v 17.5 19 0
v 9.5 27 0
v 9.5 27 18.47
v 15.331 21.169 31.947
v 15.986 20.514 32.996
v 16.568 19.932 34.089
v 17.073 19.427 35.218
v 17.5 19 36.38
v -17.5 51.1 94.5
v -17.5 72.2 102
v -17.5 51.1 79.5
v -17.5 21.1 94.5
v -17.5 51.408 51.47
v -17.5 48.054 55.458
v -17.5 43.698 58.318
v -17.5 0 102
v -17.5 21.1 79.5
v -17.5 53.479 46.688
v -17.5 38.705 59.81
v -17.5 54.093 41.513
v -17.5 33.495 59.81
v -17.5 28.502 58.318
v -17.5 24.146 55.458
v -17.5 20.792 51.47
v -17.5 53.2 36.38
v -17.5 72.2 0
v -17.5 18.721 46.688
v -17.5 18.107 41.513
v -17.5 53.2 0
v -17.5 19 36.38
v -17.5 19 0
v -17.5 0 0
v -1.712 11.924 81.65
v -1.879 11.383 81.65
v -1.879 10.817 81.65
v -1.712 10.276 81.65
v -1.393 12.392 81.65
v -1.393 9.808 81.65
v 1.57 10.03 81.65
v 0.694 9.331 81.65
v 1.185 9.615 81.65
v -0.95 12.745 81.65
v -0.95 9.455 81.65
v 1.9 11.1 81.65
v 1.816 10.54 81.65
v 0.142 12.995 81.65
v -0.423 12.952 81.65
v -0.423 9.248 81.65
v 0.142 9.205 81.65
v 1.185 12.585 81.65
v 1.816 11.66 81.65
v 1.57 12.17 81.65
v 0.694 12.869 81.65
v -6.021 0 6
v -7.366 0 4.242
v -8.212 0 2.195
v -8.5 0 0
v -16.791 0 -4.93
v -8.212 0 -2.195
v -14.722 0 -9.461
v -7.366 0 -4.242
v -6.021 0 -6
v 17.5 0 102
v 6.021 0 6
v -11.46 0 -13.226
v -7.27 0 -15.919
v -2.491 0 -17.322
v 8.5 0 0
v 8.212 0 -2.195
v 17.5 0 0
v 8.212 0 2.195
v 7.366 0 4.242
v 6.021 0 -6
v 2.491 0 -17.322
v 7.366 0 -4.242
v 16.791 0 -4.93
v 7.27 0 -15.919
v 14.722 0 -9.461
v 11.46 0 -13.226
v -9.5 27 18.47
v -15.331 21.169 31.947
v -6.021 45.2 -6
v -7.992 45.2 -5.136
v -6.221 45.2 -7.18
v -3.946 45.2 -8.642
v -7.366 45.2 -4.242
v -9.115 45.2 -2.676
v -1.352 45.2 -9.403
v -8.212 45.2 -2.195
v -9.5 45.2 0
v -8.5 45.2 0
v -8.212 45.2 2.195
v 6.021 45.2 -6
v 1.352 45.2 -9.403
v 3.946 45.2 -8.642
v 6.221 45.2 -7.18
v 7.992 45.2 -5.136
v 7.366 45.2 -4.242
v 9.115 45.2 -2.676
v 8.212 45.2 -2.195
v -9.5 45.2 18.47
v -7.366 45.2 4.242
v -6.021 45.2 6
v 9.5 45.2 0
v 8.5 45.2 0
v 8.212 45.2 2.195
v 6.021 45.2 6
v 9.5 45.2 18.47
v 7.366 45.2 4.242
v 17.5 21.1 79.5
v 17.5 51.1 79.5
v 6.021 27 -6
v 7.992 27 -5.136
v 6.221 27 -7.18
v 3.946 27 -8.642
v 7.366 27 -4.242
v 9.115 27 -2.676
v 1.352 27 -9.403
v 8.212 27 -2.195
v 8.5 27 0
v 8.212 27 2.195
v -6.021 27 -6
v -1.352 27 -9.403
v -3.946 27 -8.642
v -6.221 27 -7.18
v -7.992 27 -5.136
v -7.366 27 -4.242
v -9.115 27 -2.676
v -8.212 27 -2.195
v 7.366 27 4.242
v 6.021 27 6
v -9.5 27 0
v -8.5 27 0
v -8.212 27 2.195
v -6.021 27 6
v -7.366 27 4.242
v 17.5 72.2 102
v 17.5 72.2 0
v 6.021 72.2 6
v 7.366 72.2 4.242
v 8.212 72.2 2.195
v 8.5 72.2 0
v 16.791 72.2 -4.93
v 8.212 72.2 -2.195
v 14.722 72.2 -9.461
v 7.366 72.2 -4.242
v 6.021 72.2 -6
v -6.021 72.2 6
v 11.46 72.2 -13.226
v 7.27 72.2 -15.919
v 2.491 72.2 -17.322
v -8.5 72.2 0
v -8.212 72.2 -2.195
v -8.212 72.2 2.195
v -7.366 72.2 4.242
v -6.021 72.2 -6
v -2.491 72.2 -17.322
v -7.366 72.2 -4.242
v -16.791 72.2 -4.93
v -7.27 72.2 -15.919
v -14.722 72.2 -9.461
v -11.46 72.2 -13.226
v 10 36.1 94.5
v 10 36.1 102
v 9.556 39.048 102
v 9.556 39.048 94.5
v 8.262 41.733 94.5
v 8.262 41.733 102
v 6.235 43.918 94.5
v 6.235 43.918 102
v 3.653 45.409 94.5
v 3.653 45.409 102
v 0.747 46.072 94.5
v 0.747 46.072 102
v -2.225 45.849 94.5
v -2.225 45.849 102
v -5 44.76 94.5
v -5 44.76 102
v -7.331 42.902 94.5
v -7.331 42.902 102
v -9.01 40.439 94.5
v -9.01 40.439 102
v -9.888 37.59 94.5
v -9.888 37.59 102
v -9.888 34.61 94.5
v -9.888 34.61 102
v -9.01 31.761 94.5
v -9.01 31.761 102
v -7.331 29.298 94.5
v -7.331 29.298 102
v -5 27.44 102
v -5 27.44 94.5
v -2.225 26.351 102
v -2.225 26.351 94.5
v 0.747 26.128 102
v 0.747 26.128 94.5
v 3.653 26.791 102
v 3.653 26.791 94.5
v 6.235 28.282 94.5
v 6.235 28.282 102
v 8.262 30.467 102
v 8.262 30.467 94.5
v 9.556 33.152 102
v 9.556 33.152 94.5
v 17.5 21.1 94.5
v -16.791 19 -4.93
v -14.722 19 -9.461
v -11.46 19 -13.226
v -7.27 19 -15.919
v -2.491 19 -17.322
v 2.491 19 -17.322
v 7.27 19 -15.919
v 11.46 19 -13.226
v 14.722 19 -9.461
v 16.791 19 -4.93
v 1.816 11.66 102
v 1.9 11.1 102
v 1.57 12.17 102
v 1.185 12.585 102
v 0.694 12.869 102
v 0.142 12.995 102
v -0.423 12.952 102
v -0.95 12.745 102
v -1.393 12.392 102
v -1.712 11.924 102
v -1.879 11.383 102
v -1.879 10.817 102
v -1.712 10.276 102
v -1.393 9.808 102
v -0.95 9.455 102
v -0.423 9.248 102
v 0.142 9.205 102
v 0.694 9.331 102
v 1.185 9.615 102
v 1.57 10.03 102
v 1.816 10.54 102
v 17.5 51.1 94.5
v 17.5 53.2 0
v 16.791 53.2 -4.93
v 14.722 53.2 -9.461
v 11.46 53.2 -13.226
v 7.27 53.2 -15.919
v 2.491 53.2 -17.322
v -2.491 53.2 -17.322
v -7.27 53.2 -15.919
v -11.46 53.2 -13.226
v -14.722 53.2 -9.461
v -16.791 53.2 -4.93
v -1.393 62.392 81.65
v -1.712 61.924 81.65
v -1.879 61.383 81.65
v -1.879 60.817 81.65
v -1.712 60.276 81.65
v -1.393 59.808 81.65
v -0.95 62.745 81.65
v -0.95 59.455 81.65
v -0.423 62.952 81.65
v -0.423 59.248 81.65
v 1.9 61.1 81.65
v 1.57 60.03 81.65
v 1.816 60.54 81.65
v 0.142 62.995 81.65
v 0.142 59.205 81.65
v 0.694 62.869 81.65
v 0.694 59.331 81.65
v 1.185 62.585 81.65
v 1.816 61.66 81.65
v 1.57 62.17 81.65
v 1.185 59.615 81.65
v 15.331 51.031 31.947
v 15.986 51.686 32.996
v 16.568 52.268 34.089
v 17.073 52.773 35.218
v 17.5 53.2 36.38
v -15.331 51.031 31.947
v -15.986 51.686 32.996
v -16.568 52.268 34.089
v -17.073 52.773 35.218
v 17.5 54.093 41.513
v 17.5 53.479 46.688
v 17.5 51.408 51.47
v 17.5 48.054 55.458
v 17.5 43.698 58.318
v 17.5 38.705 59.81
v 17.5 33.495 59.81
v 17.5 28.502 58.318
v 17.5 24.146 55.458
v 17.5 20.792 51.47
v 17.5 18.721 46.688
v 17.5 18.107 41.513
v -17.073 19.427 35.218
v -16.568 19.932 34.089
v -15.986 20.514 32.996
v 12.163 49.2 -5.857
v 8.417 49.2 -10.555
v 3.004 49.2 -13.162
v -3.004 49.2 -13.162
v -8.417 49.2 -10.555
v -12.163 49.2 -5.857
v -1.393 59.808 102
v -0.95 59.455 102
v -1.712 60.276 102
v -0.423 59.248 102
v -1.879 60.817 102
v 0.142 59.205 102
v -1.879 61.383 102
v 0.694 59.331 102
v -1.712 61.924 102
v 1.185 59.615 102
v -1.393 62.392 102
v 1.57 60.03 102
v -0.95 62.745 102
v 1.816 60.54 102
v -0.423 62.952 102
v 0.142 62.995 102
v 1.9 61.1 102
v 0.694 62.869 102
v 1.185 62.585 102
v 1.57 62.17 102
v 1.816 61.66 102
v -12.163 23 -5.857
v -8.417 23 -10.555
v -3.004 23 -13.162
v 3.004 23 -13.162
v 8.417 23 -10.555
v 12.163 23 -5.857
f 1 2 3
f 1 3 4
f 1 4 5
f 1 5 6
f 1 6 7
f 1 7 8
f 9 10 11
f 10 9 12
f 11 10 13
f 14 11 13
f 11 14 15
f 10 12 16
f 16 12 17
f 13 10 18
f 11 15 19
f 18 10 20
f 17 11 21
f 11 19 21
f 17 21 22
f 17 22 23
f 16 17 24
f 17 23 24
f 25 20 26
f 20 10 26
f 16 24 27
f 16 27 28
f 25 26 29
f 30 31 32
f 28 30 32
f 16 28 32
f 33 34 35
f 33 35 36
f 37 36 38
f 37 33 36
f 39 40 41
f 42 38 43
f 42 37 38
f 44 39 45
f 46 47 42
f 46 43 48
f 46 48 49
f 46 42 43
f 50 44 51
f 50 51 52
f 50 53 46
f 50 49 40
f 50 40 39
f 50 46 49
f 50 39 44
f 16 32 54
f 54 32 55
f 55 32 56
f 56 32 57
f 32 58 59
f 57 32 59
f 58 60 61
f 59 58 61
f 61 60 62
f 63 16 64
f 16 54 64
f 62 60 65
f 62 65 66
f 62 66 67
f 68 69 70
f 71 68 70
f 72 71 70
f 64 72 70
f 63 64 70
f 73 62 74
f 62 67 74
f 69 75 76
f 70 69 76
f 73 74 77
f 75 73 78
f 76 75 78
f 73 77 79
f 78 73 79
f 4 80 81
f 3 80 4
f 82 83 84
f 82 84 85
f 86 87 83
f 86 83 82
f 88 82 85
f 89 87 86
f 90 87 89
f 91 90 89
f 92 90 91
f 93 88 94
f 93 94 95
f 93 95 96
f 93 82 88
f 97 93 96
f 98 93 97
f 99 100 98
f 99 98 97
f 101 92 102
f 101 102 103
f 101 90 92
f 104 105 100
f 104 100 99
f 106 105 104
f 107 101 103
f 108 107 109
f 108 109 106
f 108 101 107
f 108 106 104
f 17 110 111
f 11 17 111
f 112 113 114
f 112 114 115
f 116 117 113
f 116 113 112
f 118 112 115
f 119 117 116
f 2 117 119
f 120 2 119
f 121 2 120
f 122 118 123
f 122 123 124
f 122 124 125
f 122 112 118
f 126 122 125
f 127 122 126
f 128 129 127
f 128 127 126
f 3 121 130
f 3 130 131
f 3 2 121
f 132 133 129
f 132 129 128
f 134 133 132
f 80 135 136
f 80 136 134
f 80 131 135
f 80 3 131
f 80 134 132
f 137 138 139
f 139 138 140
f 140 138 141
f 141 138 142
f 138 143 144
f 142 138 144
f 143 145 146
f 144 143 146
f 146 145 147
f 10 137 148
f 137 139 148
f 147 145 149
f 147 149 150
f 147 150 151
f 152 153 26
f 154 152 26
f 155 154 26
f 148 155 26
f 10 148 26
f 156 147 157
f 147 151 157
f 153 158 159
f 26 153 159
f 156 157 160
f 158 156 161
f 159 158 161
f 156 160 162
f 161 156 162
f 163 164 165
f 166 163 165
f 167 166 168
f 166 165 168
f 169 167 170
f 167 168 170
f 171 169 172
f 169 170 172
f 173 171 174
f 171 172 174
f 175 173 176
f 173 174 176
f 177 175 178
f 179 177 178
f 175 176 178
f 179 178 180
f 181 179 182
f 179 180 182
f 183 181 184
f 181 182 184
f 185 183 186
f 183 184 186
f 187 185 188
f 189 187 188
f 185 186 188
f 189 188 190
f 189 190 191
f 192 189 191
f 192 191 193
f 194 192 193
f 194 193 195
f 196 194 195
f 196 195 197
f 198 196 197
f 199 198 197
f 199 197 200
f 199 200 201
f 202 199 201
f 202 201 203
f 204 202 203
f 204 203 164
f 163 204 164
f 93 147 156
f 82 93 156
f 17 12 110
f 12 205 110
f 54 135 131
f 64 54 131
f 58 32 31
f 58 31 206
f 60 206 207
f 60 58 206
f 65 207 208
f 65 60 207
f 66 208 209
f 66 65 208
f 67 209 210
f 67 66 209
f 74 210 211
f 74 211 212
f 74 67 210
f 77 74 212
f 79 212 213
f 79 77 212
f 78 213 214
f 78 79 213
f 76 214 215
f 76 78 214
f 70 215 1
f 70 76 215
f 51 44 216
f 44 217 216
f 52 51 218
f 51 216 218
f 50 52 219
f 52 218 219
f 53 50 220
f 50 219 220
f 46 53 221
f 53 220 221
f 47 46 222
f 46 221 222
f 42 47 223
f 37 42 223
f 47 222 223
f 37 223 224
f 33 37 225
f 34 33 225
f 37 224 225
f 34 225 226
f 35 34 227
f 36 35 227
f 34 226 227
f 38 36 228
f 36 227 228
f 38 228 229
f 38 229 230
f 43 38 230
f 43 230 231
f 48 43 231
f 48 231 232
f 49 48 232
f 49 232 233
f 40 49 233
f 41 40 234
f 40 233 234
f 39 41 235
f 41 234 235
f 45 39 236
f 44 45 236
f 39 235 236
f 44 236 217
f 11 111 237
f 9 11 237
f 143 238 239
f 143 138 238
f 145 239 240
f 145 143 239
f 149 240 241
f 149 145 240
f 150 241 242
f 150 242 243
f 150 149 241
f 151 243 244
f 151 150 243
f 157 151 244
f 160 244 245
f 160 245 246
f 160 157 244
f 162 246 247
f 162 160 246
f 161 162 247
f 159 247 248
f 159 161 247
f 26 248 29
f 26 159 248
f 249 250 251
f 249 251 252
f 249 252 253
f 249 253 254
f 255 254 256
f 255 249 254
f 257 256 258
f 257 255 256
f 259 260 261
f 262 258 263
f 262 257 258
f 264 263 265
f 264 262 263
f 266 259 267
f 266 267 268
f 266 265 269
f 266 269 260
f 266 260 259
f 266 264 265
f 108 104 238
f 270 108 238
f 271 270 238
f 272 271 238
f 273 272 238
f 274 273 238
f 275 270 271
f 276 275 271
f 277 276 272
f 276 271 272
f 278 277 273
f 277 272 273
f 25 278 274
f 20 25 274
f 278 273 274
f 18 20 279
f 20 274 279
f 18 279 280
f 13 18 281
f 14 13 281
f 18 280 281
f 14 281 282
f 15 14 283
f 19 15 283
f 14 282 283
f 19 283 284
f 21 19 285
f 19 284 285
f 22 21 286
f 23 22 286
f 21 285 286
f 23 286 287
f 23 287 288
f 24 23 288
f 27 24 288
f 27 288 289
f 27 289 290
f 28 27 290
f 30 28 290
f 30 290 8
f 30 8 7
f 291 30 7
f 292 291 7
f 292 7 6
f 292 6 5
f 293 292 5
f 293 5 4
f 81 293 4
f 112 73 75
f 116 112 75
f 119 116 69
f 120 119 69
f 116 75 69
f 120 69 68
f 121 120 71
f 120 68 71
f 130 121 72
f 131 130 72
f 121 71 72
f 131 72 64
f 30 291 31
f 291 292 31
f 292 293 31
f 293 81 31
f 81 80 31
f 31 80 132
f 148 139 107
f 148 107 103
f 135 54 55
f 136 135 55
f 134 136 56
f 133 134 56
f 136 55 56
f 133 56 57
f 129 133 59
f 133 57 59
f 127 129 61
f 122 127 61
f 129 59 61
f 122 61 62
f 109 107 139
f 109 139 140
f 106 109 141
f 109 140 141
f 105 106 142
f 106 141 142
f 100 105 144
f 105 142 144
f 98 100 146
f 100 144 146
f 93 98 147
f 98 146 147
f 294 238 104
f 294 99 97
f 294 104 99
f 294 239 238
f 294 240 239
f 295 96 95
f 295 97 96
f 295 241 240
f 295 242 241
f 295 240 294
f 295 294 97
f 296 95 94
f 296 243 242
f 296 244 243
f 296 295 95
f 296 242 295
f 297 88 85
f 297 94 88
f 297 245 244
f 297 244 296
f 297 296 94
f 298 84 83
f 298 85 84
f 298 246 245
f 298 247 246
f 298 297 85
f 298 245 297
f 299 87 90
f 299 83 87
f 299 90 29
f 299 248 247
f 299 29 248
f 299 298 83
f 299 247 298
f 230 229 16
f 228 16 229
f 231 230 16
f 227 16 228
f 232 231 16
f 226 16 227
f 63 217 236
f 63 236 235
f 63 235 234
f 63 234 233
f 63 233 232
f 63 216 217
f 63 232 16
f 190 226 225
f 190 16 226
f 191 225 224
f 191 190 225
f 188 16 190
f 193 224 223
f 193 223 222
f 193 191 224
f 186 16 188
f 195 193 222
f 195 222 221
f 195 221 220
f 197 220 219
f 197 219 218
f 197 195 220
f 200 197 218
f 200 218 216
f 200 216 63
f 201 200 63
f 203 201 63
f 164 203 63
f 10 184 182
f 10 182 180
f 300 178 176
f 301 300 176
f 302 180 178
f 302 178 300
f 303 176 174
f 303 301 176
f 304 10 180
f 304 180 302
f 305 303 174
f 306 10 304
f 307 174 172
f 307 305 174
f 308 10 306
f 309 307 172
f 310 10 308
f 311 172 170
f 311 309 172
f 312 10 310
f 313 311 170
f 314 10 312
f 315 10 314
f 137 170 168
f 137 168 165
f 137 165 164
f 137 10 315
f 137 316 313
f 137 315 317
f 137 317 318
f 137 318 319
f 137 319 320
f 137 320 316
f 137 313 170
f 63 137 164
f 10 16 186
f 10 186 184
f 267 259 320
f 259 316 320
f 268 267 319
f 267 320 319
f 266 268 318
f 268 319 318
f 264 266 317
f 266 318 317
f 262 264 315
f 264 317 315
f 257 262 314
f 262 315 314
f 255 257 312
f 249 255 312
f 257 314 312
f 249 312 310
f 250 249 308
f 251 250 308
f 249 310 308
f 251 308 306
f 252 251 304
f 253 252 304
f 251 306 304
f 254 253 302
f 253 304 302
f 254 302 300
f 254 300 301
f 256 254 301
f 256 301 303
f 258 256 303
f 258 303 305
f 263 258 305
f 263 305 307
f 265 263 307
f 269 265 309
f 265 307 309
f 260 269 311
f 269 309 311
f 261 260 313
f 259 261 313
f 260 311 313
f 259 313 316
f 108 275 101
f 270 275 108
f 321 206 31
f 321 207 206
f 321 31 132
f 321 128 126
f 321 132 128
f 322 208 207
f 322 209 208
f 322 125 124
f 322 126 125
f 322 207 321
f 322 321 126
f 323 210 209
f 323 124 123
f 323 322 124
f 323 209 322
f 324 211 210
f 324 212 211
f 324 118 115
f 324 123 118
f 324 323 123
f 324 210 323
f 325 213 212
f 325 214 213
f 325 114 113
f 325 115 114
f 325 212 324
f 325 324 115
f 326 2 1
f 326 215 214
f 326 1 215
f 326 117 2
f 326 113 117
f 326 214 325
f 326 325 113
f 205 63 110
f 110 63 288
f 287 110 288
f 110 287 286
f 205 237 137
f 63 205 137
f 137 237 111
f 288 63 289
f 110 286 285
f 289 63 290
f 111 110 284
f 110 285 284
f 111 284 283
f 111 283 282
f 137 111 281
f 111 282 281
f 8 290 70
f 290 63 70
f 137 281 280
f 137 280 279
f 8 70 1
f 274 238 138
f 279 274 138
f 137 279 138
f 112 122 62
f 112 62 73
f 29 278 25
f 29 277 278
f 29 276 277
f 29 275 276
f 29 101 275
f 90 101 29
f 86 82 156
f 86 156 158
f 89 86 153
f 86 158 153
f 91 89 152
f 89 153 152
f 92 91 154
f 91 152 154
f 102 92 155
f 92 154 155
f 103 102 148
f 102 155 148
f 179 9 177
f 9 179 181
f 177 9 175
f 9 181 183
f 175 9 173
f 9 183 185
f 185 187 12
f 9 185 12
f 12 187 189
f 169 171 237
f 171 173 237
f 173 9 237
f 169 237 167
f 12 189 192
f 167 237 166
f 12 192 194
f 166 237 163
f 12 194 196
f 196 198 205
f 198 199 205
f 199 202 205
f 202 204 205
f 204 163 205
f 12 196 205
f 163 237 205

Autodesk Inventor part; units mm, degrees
ref_plane "YZ Plane" through (0, 0, 0) normal (1, 0, 0) x (0, 1, 0)
ref_plane "XZ Plane" through (0, 0, 0) normal (0, 1, 0) x (-1, 0, 0)
sketch "Эскиз1" plane through (0, 0, 0) normal (0, 1, 0) x (-1, 0, 0)
  arc A0 (6.0208, -6) -> (6.0208, 6) centre (0, 0) ccw
  line L0 (6.0208, -6) -> (-6.0208, -6)
  arc A1 (-6.0208, 6) -> (-6.0208, -6) centre (0, 0) ccw
  line L1 (6.0208, 6) -> (-6.0208, 6)
  line L2 (17.5, 37) -> (-17.5, 37)
  line L3 (-17.5, 37) -> (-17.5, 0)
  arc A2 (-17.5, 0) -> (17.5, 0) centre (0, 0) ccw
  line L4 (17.5, 0) -> (17.5, 37)
  line L5 (17.5, 0) -> (17.5, 57)
  line L6 (-17.5, 37) -> (17.5, 37)
  line L7 (17.5, 37) -> (17.5, 57)
  line L8 (17.5, 57) -> (-17.5, 57)
  line L9 (-17.5, 57) -> (-17.5, 37)
extrude "Выдавливание1" add sketch "Эскиз1" along normal blind 27
sketch "Эскиз2" plane through (-17.5, 0, 57) normal (0, 0, 1) x (1, 0, 0)
  line L0 (0, 0) -> (35, 0)
  line L1 (35, 0) -> (35, 72.2)
  line L2 (35, 72.2) -> (0, 72.2)
  line L3 (0, 72.2) -> (0, 0)
  point P0 (17.5, 0)
  dimension "d2" = 72.2
extrude "Выдавливание2" add sketch "Эскиз2" along normal blind 27
ref_plane "РабПлоскость1" through (17.5, 36.1, 84) normal (0, 1, 0) x (1, 0, 0)
mirror "Зеркальное отражение1" about plane through (17.5, 36.1, 84) normal (0, 1, 0) of "Выдавливание1"
sketch "Эскиз3" plane through (17.5, 0, 0) normal (1, 0, 0) x (0, 0, -1)
  line L0 (-57, 45.2) -> (-57, 27) projected
  line L1 (-57, 36.1) -> (-42, 36.1)
  circle A0 centre (-42, 36.1) radius 18
  point P0 (0, 0)
  dimension "d5" = 15
  dimension "d6" = 36
extrude "Выдавливание3" cut sketch "Эскиз3" against normal blind 93.5
chamfer "Фаска2" distance 8 angle 45 8 edges at (0, 27, 26.4697) (0, 45.2, 26.4697) (-17.5, 27, 13.2349) (0, 27, -17.5) (17.5, 27, 13.2349) (-17.5, 45.2, 13.2349) (0, 45.2, -17.5) (17.5, 45.2, 13.2349)
move faces "Перенос1" translate (0, 0, 18) faces at (-5.8333, 48.1333, 84)
sketch "Эскиз4" plane through (17.5, 36.1, 42) normal (1, 0, 0) x (0, 0, -1)
  line L0 (-60, -36.1) -> (-60, 36.1) projected
  line L1 (-60, 0) -> (-45, 0)
  line L2 (-52.5, -15) -> (-37.5, -15)
  line L3 (-37.5, -15) -> (-37.5, 15)
  line L4 (-37.5, 15) -> (-52.5, 15)
  line L5 (-52.5, 15) -> (-52.5, -15)
  line L6 (-52.5, -15) -> (-37.5, 15) construction
  line L7 (-37.5, -15) -> (-52.5, 15) construction
  point P0 (42, -36.1)
  dimension "d18" = 15
  dimension "d19" = 15
  dimension "d20" = 30
extrude "Выдавливание4" cut sketch "Эскиз4" against normal blind 79.25
sketch "Эскиз5" plane through (-17.5, 0, 102) normal (0, 0, 1) x (1, 0, 0)
  line L0 (23.5208, 72.2) -> (11.4792, 72.2) projected
  line L1 (17.5, 72.2) -> (17.5, 36.1)
  circle A0 centre (17.5, 36.1) radius 10
  point P0 (17.5, 0)
  dimension "d23" = 36.1
  dimension "d24" = 20
extrude "Выдавливание5" cut sketch "Эскиз5" against normal blind 12.5
sketch "Эскиз14" plane through (-17.5, 0, 102) normal (0, 0, 1) x (1, 0, 0)
  circle A0 centre (17.5, 36.1) radius 10 projected
  line L0 (17.5, 36.1) -> (17.5, 61.1)
  circle A1 centre (17.5, 61.1) radius 1.9
  line L1 (17.5, 36.1) -> (17.5, 11.1)
  circle A2 centre (17.5, 11.1) radius 1.9
  point P0 (17.5, 0)
  dimension "d47" = 25
  dimension "d48" = 3.8
  dimension "d49" = 25
  dimension "d50" = 3.8
extrude "Выдавливание13" cut sketch "Эскиз14" against normal blind 20.35 contours A1 | A2
sketch "Эскиз15" plane through (-17.5, 0, 102) normal (0, 0, 1) x (1, 0, 0)
  circle A0 centre (17.5, 61.1) radius 1.9 projected
  circle A1 centre (17.5, 11.1) radius 1.9 projected
  circle A2 centre (17.5, 36.1) radius 10 projected
  line L0 (0, 0) -> (35, 0) projected
  line L1 (35, 0) -> (35, 72.2) projected
  line L2 (35, 72.2) -> (0, 72.2) projected
  line L3 (0, 72.2) -> (0, 0) projected
  point P0 (17.5, 0)
properties part number "joint_2_part1" material "Пластик АБС"
